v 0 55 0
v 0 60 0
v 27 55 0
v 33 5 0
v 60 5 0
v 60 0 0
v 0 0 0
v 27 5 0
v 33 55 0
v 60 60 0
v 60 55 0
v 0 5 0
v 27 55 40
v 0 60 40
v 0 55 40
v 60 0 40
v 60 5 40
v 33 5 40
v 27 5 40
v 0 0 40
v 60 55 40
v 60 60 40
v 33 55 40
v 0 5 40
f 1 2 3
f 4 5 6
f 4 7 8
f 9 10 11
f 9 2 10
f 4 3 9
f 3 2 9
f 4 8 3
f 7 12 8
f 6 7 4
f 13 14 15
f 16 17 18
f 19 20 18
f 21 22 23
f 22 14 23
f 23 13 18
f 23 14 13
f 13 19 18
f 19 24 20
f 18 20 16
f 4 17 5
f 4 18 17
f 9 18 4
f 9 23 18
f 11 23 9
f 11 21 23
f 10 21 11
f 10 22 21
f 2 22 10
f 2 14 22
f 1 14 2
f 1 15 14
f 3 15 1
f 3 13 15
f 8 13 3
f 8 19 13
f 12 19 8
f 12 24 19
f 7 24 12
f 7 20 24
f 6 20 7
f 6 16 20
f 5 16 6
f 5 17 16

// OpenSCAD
$fn = 32;

// ----------------------------------------------------------------------
// Structural section: ibeam 60 x 60 mm
// ----------------------------------------------------------------------

// --- parameters (mm) ---
sec_w = 60;               // section width, X
sec_h = 60;               // section height, Y
flange_t = 5;             // flange thickness
web_t = 6;                // web thickness
plate_t = 40;             // cut length, Z (extrusion height)

profile = [[0, 0], [60, 0], [60, 5], [33, 5], [33, 55], [60, 55], [60, 60], [0, 60], [0, 55], [27, 55], [27, 5], [0, 5]];  // primary outline, 12 points, counter clockwise

// --- the one profile operation ---
linear_extrude(height = plate_t) polygon(points = profile);
